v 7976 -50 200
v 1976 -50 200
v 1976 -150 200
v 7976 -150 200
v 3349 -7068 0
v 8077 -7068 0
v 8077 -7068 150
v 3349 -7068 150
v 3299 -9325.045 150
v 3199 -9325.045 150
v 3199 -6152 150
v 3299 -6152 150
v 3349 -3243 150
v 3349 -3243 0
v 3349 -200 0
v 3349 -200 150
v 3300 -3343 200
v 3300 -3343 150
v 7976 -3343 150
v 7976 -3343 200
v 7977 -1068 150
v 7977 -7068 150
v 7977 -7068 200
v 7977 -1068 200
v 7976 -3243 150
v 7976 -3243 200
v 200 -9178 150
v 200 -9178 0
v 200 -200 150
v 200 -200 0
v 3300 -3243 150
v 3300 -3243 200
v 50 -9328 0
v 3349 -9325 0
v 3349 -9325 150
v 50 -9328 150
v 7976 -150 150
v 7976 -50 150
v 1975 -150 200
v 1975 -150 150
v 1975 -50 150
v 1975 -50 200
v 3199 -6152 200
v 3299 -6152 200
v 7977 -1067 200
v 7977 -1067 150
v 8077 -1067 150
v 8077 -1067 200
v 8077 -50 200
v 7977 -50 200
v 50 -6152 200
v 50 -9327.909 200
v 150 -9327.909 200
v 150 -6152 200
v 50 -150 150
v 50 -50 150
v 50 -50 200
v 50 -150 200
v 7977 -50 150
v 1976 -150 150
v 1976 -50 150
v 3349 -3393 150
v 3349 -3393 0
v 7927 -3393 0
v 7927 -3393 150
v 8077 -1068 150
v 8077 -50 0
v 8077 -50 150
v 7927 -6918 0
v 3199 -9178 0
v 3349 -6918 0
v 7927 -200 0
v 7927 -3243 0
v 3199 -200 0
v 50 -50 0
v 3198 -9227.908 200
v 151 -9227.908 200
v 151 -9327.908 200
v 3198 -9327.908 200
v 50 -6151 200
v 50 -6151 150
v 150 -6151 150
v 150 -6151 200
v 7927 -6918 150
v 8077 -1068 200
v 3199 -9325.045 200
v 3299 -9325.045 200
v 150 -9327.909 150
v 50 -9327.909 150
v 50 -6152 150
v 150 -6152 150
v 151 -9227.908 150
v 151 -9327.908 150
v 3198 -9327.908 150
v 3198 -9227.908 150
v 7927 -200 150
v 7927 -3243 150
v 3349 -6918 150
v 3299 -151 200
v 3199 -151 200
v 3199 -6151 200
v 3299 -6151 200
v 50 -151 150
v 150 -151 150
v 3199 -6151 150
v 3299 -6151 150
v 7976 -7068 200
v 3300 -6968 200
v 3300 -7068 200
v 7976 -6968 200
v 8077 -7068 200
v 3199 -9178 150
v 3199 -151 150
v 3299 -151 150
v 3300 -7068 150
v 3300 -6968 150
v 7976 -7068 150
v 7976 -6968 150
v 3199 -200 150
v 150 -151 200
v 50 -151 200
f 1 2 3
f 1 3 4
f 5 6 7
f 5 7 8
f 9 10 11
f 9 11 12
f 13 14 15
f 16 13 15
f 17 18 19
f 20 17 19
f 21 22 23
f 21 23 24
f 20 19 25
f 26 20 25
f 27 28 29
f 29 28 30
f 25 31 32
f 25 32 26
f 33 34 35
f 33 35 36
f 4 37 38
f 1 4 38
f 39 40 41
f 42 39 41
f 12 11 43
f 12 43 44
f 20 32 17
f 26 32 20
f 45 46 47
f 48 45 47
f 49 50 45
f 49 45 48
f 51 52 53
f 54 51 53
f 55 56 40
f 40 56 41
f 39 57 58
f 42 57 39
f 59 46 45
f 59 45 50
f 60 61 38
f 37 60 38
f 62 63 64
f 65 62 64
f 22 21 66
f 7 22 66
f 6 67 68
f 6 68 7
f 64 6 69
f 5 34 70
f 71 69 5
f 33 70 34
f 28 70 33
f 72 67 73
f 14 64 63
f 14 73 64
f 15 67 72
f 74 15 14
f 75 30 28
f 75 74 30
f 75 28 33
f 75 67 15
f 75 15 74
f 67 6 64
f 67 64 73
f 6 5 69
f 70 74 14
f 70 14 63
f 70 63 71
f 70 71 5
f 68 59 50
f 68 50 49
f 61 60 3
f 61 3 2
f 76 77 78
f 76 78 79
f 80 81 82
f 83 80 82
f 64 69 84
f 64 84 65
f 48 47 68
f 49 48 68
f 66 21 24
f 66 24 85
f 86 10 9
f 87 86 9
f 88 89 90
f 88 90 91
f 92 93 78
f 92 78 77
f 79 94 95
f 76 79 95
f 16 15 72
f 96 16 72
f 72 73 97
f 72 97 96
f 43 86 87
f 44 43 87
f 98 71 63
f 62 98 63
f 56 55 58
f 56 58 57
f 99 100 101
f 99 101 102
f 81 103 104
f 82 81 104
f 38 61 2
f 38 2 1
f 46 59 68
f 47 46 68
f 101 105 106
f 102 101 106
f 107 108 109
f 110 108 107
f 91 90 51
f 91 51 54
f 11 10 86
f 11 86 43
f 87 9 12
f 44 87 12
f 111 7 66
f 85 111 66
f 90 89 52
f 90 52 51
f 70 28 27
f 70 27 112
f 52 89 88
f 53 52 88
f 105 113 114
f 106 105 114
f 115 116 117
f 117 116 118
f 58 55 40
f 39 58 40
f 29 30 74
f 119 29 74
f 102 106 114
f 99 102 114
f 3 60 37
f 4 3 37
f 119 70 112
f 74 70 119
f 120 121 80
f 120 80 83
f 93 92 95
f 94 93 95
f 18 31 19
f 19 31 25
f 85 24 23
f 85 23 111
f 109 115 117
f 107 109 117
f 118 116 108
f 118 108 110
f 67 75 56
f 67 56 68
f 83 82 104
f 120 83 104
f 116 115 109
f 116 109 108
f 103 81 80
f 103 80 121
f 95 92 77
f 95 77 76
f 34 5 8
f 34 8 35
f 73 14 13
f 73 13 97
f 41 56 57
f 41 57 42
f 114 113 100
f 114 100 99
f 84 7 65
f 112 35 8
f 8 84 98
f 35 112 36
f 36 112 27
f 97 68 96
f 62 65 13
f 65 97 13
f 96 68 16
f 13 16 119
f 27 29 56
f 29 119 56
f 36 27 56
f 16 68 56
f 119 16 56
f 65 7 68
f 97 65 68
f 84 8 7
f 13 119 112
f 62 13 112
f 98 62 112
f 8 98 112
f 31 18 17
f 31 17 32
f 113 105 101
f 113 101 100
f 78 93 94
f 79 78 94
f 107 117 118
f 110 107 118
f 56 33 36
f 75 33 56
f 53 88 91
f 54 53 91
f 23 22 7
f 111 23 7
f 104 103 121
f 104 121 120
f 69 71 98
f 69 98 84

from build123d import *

# Parameters (mm, degrees)
SKETCH_1_W         = 2999
SKETCH_1_H         = 8978
SKETCH_1_W_2       = 4578
SKETCH_1_H_2       = 3043
SKETCH_1_H_3       = 3525
EXTRUDE_1_DEPTH    = 150
SKETCH_2_W         = 100
SKETCH_2_H         = 6000
EXTRUDE_2_DEPTH    = 50
SKETCH_2_H_2       = 1017
EXTRUDE_2_2_DEPTH  = 50
SKETCH_2_W_2       = 6000
SKETCH_2_H_3       = 100
EXTRUDE_2_3_DEPTH  = 50
SKETCH_2_W_3       = 1925
EXTRUDE_2_4_DEPTH  = 50
EXTRUDE_2_5_DEPTH  = 50
EXTRUDE_2_6_DEPTH  = 50
SKETCH_2_H_4       = 3173.045468324
EXTRUDE_2_7_DEPTH  = 50
SKETCH_2_H_5       = 3175.909063353
EXTRUDE_2_8_DEPTH  = 50
SKETCH_2_W_4       = 3047
EXTRUDE_2_9_DEPTH  = 50
SKETCH_2_W_5       = 4676
EXTRUDE_2_10_DEPTH = 50
EXTRUDE_2_11_DEPTH = 50


with BuildPart() as part:
    # Эскиз1 → Бобышка-Вытянуть1 (new body)
    with BuildSketch(Plane.XY):
        Polygon((50, -50), (8077, -50), (8077, -7068), (3349, -7068), (3349, -9325), (50, -9328), align=None)
        with Locations((1699.5, -4689)):
            Rectangle(SKETCH_1_W, SKETCH_1_H, mode=Mode.SUBTRACT)
        with Locations((5638, -1721.5)):
            Rectangle(SKETCH_1_W_2, SKETCH_1_H_2, mode=Mode.SUBTRACT)
        with Locations((5638, -5155.5)):
            Rectangle(SKETCH_1_W_2, SKETCH_1_H_3, mode=Mode.SUBTRACT)
    extrude(amount=EXTRUDE_1_DEPTH)


with BuildPart() as body_2:
    # Эскиз2 → Бобышка-Вытянуть2 (new body)
    with BuildSketch(Plane.XY.offset(150)):
        with Locations((8027, -4068)):
            Rectangle(SKETCH_2_W, SKETCH_2_H)
    extrude(amount=EXTRUDE_2_DEPTH)


with BuildPart() as body_3:
    # Эскиз2 → Extrude 2 2 (new body)
    with BuildSketch(Plane.XY.offset(150)):
        with Locations((8027, -558.5)):
            Rectangle(SKETCH_2_W, SKETCH_2_H_2)
    extrude(amount=EXTRUDE_2_2_DEPTH)


with BuildPart() as body_4:
    # Эскиз2 → Extrude 2 3 (new body)
    with BuildSketch(Plane.XY.offset(150)):
        with Locations((4976, -100)):
            Rectangle(SKETCH_2_W_2, SKETCH_2_H_3)
    extrude(amount=EXTRUDE_2_3_DEPTH)


with BuildPart() as body_5:
    # Эскиз2 → Extrude 2 4 (new body)
    with BuildSketch(Plane.XY.offset(150)):
        with Locations((1012.5, -100)):
            Rectangle(SKETCH_2_W_3, SKETCH_2_H_3)
    extrude(amount=EXTRUDE_2_4_DEPTH)


with BuildPart() as body_6:
    # Эскиз2 → Extrude 2 5 (new body)
    with BuildSketch(Plane.XY.offset(150)):
        with Locations((100, -3151)):
            Rectangle(SKETCH_2_W, SKETCH_2_H)
    extrude(amount=EXTRUDE_2_5_DEPTH)


with BuildPart() as body_7:
    # Эскиз2 → Extrude 2 6 (new body)
    with BuildSketch(Plane.XY.offset(150)):
        with Locations((3249, -3151)):
            Rectangle(SKETCH_2_W, SKETCH_2_H)
    extrude(amount=EXTRUDE_2_6_DEPTH)


with BuildPart() as body_8:
    # Эскиз2 → Extrude 2 7 (new body)
    with BuildSketch(Plane.XY.offset(150)):
        with Locations((3249, -7738.522734162)):
            Rectangle(SKETCH_2_W, SKETCH_2_H_4)
    extrude(amount=EXTRUDE_2_7_DEPTH)


with BuildPart() as body_9:
    # Эскиз2 → Extrude 2 8 (new body)
    with BuildSketch(Plane.XY.offset(150)):
        with Locations((100, -7739.954531677)):
            Rectangle(SKETCH_2_W, SKETCH_2_H_5)
    extrude(amount=EXTRUDE_2_8_DEPTH)


with BuildPart() as body_10:
    # Эскиз2 → Extrude 2 9 (new body)
    with BuildSketch(Plane.XY.offset(150)):
        with Locations((1674.5, -9277.908153986)):
            Rectangle(SKETCH_2_W_4, SKETCH_2_H_3)
    extrude(amount=EXTRUDE_2_9_DEPTH)


with BuildPart() as body_11:
    # Эскиз2 → Extrude 2 10 (new body)
    with BuildSketch(Plane.XY.offset(150)):
        with Locations((5638, -7018)):
            Rectangle(SKETCH_2_W_5, SKETCH_2_H_3)
    extrude(amount=EXTRUDE_2_10_DEPTH)


with BuildPart() as body_12:
    # Эскиз2 → Extrude 2 11 (new body)
    with BuildSketch(Plane.XY.offset(150)):
        with Locations((5638, -3293)):
            Rectangle(SKETCH_2_W_5, SKETCH_2_H_3)
    extrude(amount=EXTRUDE_2_11_DEPTH)


solid = Compound([part.part, body_2.part, body_3.part, body_4.part, body_5.part, body_6.part, body_7.part, body_8.part, body_9.part, body_10.part, body_11.part, body_12.part])
